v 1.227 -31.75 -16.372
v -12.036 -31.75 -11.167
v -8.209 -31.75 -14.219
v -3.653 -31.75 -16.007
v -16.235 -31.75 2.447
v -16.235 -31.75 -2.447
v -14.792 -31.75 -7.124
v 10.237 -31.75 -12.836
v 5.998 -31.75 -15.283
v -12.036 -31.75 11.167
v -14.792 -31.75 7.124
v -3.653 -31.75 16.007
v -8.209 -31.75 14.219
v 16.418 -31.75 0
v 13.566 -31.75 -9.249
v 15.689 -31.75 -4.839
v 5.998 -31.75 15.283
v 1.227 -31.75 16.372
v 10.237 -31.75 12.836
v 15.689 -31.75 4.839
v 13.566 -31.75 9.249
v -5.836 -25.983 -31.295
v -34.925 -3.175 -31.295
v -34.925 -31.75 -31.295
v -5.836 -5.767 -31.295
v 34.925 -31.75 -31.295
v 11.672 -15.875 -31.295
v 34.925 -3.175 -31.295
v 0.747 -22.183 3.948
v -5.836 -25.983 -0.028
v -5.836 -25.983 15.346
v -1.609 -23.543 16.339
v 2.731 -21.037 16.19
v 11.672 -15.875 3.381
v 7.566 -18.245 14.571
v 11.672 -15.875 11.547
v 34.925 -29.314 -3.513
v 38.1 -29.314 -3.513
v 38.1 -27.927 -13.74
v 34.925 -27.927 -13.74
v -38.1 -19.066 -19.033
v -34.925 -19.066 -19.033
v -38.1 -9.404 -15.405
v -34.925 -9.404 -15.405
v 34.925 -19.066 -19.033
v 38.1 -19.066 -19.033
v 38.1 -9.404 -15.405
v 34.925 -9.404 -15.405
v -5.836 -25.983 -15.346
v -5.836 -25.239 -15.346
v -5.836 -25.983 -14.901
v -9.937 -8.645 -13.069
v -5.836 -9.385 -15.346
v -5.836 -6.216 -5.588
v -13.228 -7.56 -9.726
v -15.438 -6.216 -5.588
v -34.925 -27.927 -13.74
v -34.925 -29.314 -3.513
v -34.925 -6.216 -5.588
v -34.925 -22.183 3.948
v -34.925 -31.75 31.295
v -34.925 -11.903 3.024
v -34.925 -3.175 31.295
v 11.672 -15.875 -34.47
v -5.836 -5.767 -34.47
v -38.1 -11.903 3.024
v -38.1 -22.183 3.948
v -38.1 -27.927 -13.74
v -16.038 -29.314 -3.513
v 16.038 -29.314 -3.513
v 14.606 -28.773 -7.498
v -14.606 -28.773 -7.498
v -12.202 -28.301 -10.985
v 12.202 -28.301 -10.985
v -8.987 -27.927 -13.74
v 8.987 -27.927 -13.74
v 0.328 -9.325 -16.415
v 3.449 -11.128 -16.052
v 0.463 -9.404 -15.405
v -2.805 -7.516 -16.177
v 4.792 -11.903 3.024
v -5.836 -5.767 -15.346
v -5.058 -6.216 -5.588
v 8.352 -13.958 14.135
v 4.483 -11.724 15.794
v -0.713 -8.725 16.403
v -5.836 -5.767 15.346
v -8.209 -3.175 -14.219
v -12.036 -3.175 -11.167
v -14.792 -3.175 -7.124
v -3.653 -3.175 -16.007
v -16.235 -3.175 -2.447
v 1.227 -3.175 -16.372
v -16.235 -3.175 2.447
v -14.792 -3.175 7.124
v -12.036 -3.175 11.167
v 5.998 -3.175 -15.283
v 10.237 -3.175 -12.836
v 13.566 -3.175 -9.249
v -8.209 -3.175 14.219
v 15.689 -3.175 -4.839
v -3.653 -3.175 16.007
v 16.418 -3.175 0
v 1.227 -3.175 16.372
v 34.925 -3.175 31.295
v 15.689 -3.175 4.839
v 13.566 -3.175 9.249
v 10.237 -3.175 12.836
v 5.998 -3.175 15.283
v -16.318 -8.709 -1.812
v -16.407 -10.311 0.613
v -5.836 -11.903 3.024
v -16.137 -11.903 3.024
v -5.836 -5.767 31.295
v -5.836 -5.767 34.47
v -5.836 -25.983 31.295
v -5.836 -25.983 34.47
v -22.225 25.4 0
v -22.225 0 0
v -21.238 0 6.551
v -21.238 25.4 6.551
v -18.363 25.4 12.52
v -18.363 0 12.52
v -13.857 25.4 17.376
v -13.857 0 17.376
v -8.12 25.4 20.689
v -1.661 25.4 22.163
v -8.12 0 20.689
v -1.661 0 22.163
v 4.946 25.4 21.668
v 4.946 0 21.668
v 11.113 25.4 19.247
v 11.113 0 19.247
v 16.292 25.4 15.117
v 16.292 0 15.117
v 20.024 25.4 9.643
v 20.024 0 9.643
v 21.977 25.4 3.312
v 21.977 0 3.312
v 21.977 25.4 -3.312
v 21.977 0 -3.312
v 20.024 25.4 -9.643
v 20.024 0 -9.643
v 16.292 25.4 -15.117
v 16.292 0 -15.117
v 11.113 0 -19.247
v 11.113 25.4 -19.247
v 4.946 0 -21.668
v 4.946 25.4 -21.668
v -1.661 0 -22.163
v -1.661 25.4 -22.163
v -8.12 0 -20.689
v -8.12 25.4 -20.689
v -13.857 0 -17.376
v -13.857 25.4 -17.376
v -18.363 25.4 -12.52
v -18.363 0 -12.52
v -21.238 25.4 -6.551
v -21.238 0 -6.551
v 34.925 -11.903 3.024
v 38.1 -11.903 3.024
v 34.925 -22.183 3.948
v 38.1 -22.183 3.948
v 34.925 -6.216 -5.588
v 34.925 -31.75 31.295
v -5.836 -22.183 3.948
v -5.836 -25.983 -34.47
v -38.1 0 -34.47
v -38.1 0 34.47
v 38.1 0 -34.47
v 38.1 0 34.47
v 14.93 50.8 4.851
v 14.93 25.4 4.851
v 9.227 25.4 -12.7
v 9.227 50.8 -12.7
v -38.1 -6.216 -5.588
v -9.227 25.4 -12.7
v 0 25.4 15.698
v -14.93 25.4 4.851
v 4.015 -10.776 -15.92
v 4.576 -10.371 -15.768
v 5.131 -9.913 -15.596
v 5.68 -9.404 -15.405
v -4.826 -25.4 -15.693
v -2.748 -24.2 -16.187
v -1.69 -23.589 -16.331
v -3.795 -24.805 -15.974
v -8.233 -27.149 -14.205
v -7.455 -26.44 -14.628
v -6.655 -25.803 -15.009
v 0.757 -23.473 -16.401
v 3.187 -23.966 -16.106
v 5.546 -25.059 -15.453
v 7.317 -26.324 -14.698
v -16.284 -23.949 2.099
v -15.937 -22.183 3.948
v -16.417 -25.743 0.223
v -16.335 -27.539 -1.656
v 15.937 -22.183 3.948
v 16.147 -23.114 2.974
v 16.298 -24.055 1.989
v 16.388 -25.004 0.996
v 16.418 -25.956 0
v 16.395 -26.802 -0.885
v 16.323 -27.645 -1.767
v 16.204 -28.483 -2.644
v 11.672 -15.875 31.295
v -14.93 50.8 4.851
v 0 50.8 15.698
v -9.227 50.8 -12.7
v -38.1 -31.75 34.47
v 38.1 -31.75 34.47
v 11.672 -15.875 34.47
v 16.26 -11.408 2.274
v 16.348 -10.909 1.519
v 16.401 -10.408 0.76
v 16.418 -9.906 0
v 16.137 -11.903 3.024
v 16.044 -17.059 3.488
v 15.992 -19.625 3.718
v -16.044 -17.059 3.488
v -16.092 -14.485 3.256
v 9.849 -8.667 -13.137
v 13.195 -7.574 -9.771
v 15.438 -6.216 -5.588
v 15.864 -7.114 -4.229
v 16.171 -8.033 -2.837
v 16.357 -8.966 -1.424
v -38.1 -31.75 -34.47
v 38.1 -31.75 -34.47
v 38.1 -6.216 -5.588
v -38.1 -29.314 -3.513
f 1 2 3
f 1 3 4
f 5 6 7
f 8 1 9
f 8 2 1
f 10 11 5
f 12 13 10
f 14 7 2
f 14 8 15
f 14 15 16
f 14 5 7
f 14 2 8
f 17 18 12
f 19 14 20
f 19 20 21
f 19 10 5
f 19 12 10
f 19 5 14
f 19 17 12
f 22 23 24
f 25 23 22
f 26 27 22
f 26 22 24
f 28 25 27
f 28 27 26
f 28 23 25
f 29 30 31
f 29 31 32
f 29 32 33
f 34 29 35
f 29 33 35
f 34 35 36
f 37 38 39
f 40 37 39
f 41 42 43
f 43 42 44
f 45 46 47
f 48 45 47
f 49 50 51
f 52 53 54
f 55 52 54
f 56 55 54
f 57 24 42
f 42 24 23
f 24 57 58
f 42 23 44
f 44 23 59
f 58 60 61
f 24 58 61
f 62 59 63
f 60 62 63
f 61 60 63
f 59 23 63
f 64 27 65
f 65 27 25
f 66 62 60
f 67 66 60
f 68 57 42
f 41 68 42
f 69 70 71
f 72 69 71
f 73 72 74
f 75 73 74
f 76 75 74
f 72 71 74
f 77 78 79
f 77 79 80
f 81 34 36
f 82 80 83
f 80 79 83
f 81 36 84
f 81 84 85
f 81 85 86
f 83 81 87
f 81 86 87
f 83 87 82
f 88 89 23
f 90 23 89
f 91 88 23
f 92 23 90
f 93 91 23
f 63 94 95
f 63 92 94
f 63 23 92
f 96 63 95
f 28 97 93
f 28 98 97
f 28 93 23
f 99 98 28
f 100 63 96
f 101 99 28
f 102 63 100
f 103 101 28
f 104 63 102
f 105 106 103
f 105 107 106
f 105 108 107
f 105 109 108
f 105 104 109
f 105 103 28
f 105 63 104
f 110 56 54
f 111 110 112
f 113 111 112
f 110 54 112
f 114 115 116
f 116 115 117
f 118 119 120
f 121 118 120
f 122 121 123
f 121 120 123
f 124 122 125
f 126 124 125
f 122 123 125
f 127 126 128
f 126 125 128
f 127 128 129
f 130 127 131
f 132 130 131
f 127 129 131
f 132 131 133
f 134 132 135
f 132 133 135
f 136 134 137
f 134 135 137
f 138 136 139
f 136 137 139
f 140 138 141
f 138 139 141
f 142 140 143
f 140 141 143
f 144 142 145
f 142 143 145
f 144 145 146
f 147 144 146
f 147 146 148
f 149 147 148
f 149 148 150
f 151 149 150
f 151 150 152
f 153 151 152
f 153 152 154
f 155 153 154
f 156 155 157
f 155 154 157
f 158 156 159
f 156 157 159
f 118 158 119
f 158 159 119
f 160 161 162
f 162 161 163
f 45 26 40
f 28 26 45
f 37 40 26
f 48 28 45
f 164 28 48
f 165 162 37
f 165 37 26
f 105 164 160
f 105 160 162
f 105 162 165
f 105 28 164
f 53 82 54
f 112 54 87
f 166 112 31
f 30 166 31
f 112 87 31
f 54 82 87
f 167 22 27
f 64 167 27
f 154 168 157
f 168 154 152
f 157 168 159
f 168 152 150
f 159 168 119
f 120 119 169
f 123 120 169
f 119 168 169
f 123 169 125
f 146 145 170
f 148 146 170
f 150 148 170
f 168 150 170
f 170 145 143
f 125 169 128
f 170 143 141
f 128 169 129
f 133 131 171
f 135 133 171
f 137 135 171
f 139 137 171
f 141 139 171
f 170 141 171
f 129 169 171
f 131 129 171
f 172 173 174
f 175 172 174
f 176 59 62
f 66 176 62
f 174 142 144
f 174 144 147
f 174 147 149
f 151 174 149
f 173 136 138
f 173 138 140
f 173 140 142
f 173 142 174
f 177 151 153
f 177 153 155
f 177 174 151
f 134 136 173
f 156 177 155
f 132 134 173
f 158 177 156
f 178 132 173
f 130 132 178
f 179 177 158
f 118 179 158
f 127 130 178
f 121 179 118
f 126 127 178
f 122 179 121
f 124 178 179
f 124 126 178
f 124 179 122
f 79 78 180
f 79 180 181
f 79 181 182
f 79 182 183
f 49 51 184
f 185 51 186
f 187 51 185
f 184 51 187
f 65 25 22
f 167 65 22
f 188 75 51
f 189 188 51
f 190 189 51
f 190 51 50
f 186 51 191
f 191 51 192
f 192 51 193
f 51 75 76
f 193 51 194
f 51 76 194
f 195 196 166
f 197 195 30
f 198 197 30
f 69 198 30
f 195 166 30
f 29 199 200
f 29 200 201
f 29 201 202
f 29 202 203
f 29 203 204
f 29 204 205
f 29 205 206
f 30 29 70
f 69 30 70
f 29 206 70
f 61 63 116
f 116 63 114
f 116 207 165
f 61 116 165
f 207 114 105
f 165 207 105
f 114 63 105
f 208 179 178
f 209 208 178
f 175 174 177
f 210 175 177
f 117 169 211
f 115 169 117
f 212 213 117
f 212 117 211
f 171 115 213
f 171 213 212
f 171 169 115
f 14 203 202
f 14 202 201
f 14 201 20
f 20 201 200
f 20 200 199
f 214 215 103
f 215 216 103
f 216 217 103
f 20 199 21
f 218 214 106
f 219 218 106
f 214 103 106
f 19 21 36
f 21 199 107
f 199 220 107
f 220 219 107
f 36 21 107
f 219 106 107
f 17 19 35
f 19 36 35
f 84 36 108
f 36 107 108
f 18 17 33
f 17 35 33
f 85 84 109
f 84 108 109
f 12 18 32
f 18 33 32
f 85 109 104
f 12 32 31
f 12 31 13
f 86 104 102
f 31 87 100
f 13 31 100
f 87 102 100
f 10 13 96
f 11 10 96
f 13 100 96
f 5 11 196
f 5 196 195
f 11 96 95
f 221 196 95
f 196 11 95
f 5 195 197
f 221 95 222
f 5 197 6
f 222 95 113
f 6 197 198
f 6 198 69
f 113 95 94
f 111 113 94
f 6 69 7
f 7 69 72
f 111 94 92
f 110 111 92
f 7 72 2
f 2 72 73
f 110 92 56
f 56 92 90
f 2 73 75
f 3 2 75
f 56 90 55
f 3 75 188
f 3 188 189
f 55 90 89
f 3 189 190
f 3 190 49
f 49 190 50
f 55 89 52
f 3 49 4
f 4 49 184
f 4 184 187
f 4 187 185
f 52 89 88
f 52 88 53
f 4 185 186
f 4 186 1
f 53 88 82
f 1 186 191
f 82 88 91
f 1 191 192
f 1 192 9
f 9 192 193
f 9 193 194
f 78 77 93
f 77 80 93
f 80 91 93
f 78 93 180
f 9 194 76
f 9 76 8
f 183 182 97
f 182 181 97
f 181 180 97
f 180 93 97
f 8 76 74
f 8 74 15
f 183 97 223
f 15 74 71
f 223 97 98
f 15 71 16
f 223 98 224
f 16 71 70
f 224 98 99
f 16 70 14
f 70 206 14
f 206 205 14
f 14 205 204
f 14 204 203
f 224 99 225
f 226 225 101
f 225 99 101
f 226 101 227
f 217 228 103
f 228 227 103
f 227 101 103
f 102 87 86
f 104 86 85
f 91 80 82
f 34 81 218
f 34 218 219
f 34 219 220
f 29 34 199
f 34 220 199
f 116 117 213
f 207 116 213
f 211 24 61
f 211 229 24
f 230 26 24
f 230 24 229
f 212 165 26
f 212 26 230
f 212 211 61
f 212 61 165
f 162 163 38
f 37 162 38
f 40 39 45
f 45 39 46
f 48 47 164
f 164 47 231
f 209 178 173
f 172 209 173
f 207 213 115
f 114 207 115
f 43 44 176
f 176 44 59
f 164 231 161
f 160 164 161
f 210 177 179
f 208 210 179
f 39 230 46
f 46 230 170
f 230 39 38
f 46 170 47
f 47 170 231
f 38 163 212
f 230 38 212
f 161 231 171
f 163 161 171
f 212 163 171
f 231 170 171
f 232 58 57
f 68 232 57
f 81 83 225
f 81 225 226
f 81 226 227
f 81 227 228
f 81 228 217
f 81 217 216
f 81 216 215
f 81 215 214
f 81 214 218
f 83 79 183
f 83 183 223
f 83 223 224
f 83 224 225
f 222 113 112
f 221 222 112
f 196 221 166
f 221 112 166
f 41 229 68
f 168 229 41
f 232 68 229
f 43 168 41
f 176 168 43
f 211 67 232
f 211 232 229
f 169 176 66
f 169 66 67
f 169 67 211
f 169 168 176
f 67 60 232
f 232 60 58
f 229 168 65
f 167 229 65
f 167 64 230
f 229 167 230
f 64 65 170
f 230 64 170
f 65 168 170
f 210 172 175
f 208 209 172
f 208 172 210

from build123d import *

# Parameters (mm, degrees)
F0_W      = 76.2
F0_H      = 68.939676
F10_DEPTH = 31.75
F1_T      = -3.175
F2_R      = 22.225
F3_DEPTH  = 25.4
F5_DEPTH  = 25.4
F11_R     = 16.418379
F6_DEPTH  = 28.575
F8_DEPTH  = 76.201
F12_DEPTH = 68.940675


with BuildPart() as f10:
    # F0 (on Front) → F10 (new body)
    with BuildSketch(Plane.XZ):
        Rectangle(F0_W, F0_H)
    extrude(amount=F10_DEPTH)

    # F1
    f1_openings = [f10.faces().sort_by_distance(p)[0] for p in [
        (0, -31.75, 0),
    ]]
    offset(amount=F1_T, openings=f1_openings)

    # F2 (on face) → F3 (join)
    with BuildSketch(Plane(origin=(0, 0, 0), x_dir=(-1, 0, 0), z_dir=(0, 1, 0))):
        Circle(F2_R)
    extrude(amount=F3_DEPTH)

    # F4 (on face) → F5 (join)
    with BuildSketch(Plane(origin=(0, 25.4, 0), x_dir=(-1, 0, 0), z_dir=(0, 1, 0))):
        Polygon((-9.22709, -12.7), (9.22709, -12.7), (14.929745, 4.850968), (0, 15.698063), (-14.929745, 4.850968), align=None)
    extrude(amount=F5_DEPTH)

    # F11 (on face) → F6 (join, through all)
    with BuildSketch(Plane.XZ.offset(3.175)):
        Circle(F11_R)
    extrude(amount=F6_DEPTH)

    # F7 (on face) → F8 (cut, through all)
    with BuildSketch(Plane.YZ.offset(38.1)):
        Polygon((-27.926964, -13.740439), (-19.06612, -19.032735), (-9.40379, -15.40474), (-6.215907, -5.588409), (-11.903011, 3.024361), (-22.182597, 3.947978), (-29.313927, -3.51306), align=None)
    extrude(amount=-F8_DEPTH, mode=Mode.SUBTRACT)

    # F9 (on face) → F12 (cut, through all)
    with BuildSketch(Plane.XY.offset(34.469838)):
        Polygon((-5.835976, -5.766792), (-5.835976, -25.983208), (11.671953, -15.875), align=None)
    extrude(amount=-F12_DEPTH, mode=Mode.SUBTRACT)


solid = f10.part
